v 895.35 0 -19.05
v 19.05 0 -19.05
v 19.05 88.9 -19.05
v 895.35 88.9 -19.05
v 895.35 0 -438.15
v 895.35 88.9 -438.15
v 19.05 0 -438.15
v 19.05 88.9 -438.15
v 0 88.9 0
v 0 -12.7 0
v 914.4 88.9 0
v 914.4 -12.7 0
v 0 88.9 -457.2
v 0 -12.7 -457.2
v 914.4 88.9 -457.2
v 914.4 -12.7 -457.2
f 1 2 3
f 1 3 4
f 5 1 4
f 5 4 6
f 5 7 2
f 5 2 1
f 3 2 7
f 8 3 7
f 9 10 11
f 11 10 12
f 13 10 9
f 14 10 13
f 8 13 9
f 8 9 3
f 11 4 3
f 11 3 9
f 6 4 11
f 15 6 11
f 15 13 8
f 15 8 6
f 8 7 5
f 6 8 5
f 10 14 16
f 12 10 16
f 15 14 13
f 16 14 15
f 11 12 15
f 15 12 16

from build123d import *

# Parameters (mm, degrees)
SKETCH2_W           = 914.4
SKETCH2_H           = 457.2
BOSS_EXTRUDE2_DEPTH = 12.7
SKETCH1_W           = 914.4
SKETCH1_H           = 457.2
SKETCH1_W_2         = 876.3
SKETCH1_H_2         = 419.1
BOSS_EXTRUDE3_DEPTH = 88.9


with BuildPart() as part:
    # Sketch2 → Boss-Extrude2 (new body)
    with BuildSketch(Plane(origin=(0, 0, 0), x_dir=(1, 0, 0), z_dir=(0, 1, 0))):
        with Locations((457.2, 228.6)):
            Rectangle(SKETCH2_W, SKETCH2_H)
    extrude(amount=-BOSS_EXTRUDE2_DEPTH)

    # Sketch1 → Boss-Extrude3 (add)
    with BuildSketch(Plane(origin=(0, 0, 0), x_dir=(1, 0, 0), z_dir=(0, 1, 0))):
        with Locations((457.2, 228.6)):
            Rectangle(SKETCH1_W, SKETCH1_H)
        with Locations((457.2, 228.6)):
            Rectangle(SKETCH1_W_2, SKETCH1_H_2, mode=Mode.SUBTRACT)
    extrude(amount=BOSS_EXTRUDE3_DEPTH)


solid = part.part
